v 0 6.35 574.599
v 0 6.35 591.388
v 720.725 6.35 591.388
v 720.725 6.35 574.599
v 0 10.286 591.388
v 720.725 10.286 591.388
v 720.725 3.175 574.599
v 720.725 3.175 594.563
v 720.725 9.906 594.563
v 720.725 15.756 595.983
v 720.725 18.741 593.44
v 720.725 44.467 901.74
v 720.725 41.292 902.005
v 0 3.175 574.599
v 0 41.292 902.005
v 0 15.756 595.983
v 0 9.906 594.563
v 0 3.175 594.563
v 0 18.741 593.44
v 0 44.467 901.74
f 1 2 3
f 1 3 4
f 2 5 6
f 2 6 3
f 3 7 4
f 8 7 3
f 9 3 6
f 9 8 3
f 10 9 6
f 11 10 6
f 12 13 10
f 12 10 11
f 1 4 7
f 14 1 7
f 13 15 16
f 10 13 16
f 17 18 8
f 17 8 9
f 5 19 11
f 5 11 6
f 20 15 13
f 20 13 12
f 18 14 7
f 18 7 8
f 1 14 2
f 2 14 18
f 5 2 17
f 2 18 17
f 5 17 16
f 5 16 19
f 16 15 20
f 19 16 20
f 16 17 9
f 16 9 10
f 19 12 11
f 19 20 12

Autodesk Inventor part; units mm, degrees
ref_plane "YZ Plane" through (0, 0, 0) normal (1, 0, 0) x (0, 1, 0)
ref_plane "XZ Plane" through (0, 0, 0) normal (0, 1, 0) x (-1, 0, 0)
ref_plane "XY Plane" through (0, 0, 0) normal (0, 0, 1) x (1, 0, 0)
sketch "Sketch1" plane through (0, 0, 0) normal (1, 0, 0) x (0, 1, 0)
  line L0 (0, 0) -> (0, 597.7382)
  line L1 (0, 0) -> (3.175, 0)
  line L2 (3.175, 0) -> (3.175, 594.5632)
  line L3 (3.175, 594.5632) -> (9.906, 594.5632)
  line L4 (9.906, 594.5632) -> (15.756, 595.9828)
  line L5 (0, 597.7382) -> (9.5263, 597.7382)
  line L6 (9.5263, 597.7382) -> (12.7824, 598.5283)
  line L7 (41.2921, 902.0052) -> (15.756, 595.9828)
  line L8 (12.7824, 598.5283) -> (38.1281, 902.2692)
  line L9 (38.1281, 902.2692) -> (41.2921, 902.0052)
  line L10 (41.2921, 902.0052) -> (44.4671, 901.7403)
  line L11 (44.4671, 901.7403) -> (18.7409, 593.44)
  line L12 (18.7409, 593.44) -> (10.2857, 591.3882)
  line L13 (10.2857, 591.3882) -> (6.35, 591.3882)
  line L14 (6.35, 591.3882) -> (6.35, 574.5988)
  line L15 (6.35, 574.5988) -> (3.175, 574.5988)
  dimension "d0" = 594.5632
  dimension "d1" = 3.175
  dimension "d2" = 6.731
  dimension "d7" = 3.175
  dimension "d8" = 6.0198
  dimension "d9" = 166.36
  dimension "d10" = 3.175
  dimension "d11" = 108.41
  dimension "d12" = 3.175
  dimension "d13" = 307.086
  dimension "d16" = 3.175
  dimension "d18" = 3.175
  dimension "d20" = 307.1025
  dimension "d21" = 8.7006
  dimension "d22" = 3.175
  dimension "d23" = 3.175
  dimension "d24" = 3.9357
  dimension "d25" = 16.7894
extrude "Extrusion2" add sketch "Sketch1" along normal blind 720.725 contours L2 L3 L4 L7 L10 L11 L12 L13 L14 L15
properties part number "First_Shingle_Over_Intake_Vent_With_Length_28.375_Inches"
